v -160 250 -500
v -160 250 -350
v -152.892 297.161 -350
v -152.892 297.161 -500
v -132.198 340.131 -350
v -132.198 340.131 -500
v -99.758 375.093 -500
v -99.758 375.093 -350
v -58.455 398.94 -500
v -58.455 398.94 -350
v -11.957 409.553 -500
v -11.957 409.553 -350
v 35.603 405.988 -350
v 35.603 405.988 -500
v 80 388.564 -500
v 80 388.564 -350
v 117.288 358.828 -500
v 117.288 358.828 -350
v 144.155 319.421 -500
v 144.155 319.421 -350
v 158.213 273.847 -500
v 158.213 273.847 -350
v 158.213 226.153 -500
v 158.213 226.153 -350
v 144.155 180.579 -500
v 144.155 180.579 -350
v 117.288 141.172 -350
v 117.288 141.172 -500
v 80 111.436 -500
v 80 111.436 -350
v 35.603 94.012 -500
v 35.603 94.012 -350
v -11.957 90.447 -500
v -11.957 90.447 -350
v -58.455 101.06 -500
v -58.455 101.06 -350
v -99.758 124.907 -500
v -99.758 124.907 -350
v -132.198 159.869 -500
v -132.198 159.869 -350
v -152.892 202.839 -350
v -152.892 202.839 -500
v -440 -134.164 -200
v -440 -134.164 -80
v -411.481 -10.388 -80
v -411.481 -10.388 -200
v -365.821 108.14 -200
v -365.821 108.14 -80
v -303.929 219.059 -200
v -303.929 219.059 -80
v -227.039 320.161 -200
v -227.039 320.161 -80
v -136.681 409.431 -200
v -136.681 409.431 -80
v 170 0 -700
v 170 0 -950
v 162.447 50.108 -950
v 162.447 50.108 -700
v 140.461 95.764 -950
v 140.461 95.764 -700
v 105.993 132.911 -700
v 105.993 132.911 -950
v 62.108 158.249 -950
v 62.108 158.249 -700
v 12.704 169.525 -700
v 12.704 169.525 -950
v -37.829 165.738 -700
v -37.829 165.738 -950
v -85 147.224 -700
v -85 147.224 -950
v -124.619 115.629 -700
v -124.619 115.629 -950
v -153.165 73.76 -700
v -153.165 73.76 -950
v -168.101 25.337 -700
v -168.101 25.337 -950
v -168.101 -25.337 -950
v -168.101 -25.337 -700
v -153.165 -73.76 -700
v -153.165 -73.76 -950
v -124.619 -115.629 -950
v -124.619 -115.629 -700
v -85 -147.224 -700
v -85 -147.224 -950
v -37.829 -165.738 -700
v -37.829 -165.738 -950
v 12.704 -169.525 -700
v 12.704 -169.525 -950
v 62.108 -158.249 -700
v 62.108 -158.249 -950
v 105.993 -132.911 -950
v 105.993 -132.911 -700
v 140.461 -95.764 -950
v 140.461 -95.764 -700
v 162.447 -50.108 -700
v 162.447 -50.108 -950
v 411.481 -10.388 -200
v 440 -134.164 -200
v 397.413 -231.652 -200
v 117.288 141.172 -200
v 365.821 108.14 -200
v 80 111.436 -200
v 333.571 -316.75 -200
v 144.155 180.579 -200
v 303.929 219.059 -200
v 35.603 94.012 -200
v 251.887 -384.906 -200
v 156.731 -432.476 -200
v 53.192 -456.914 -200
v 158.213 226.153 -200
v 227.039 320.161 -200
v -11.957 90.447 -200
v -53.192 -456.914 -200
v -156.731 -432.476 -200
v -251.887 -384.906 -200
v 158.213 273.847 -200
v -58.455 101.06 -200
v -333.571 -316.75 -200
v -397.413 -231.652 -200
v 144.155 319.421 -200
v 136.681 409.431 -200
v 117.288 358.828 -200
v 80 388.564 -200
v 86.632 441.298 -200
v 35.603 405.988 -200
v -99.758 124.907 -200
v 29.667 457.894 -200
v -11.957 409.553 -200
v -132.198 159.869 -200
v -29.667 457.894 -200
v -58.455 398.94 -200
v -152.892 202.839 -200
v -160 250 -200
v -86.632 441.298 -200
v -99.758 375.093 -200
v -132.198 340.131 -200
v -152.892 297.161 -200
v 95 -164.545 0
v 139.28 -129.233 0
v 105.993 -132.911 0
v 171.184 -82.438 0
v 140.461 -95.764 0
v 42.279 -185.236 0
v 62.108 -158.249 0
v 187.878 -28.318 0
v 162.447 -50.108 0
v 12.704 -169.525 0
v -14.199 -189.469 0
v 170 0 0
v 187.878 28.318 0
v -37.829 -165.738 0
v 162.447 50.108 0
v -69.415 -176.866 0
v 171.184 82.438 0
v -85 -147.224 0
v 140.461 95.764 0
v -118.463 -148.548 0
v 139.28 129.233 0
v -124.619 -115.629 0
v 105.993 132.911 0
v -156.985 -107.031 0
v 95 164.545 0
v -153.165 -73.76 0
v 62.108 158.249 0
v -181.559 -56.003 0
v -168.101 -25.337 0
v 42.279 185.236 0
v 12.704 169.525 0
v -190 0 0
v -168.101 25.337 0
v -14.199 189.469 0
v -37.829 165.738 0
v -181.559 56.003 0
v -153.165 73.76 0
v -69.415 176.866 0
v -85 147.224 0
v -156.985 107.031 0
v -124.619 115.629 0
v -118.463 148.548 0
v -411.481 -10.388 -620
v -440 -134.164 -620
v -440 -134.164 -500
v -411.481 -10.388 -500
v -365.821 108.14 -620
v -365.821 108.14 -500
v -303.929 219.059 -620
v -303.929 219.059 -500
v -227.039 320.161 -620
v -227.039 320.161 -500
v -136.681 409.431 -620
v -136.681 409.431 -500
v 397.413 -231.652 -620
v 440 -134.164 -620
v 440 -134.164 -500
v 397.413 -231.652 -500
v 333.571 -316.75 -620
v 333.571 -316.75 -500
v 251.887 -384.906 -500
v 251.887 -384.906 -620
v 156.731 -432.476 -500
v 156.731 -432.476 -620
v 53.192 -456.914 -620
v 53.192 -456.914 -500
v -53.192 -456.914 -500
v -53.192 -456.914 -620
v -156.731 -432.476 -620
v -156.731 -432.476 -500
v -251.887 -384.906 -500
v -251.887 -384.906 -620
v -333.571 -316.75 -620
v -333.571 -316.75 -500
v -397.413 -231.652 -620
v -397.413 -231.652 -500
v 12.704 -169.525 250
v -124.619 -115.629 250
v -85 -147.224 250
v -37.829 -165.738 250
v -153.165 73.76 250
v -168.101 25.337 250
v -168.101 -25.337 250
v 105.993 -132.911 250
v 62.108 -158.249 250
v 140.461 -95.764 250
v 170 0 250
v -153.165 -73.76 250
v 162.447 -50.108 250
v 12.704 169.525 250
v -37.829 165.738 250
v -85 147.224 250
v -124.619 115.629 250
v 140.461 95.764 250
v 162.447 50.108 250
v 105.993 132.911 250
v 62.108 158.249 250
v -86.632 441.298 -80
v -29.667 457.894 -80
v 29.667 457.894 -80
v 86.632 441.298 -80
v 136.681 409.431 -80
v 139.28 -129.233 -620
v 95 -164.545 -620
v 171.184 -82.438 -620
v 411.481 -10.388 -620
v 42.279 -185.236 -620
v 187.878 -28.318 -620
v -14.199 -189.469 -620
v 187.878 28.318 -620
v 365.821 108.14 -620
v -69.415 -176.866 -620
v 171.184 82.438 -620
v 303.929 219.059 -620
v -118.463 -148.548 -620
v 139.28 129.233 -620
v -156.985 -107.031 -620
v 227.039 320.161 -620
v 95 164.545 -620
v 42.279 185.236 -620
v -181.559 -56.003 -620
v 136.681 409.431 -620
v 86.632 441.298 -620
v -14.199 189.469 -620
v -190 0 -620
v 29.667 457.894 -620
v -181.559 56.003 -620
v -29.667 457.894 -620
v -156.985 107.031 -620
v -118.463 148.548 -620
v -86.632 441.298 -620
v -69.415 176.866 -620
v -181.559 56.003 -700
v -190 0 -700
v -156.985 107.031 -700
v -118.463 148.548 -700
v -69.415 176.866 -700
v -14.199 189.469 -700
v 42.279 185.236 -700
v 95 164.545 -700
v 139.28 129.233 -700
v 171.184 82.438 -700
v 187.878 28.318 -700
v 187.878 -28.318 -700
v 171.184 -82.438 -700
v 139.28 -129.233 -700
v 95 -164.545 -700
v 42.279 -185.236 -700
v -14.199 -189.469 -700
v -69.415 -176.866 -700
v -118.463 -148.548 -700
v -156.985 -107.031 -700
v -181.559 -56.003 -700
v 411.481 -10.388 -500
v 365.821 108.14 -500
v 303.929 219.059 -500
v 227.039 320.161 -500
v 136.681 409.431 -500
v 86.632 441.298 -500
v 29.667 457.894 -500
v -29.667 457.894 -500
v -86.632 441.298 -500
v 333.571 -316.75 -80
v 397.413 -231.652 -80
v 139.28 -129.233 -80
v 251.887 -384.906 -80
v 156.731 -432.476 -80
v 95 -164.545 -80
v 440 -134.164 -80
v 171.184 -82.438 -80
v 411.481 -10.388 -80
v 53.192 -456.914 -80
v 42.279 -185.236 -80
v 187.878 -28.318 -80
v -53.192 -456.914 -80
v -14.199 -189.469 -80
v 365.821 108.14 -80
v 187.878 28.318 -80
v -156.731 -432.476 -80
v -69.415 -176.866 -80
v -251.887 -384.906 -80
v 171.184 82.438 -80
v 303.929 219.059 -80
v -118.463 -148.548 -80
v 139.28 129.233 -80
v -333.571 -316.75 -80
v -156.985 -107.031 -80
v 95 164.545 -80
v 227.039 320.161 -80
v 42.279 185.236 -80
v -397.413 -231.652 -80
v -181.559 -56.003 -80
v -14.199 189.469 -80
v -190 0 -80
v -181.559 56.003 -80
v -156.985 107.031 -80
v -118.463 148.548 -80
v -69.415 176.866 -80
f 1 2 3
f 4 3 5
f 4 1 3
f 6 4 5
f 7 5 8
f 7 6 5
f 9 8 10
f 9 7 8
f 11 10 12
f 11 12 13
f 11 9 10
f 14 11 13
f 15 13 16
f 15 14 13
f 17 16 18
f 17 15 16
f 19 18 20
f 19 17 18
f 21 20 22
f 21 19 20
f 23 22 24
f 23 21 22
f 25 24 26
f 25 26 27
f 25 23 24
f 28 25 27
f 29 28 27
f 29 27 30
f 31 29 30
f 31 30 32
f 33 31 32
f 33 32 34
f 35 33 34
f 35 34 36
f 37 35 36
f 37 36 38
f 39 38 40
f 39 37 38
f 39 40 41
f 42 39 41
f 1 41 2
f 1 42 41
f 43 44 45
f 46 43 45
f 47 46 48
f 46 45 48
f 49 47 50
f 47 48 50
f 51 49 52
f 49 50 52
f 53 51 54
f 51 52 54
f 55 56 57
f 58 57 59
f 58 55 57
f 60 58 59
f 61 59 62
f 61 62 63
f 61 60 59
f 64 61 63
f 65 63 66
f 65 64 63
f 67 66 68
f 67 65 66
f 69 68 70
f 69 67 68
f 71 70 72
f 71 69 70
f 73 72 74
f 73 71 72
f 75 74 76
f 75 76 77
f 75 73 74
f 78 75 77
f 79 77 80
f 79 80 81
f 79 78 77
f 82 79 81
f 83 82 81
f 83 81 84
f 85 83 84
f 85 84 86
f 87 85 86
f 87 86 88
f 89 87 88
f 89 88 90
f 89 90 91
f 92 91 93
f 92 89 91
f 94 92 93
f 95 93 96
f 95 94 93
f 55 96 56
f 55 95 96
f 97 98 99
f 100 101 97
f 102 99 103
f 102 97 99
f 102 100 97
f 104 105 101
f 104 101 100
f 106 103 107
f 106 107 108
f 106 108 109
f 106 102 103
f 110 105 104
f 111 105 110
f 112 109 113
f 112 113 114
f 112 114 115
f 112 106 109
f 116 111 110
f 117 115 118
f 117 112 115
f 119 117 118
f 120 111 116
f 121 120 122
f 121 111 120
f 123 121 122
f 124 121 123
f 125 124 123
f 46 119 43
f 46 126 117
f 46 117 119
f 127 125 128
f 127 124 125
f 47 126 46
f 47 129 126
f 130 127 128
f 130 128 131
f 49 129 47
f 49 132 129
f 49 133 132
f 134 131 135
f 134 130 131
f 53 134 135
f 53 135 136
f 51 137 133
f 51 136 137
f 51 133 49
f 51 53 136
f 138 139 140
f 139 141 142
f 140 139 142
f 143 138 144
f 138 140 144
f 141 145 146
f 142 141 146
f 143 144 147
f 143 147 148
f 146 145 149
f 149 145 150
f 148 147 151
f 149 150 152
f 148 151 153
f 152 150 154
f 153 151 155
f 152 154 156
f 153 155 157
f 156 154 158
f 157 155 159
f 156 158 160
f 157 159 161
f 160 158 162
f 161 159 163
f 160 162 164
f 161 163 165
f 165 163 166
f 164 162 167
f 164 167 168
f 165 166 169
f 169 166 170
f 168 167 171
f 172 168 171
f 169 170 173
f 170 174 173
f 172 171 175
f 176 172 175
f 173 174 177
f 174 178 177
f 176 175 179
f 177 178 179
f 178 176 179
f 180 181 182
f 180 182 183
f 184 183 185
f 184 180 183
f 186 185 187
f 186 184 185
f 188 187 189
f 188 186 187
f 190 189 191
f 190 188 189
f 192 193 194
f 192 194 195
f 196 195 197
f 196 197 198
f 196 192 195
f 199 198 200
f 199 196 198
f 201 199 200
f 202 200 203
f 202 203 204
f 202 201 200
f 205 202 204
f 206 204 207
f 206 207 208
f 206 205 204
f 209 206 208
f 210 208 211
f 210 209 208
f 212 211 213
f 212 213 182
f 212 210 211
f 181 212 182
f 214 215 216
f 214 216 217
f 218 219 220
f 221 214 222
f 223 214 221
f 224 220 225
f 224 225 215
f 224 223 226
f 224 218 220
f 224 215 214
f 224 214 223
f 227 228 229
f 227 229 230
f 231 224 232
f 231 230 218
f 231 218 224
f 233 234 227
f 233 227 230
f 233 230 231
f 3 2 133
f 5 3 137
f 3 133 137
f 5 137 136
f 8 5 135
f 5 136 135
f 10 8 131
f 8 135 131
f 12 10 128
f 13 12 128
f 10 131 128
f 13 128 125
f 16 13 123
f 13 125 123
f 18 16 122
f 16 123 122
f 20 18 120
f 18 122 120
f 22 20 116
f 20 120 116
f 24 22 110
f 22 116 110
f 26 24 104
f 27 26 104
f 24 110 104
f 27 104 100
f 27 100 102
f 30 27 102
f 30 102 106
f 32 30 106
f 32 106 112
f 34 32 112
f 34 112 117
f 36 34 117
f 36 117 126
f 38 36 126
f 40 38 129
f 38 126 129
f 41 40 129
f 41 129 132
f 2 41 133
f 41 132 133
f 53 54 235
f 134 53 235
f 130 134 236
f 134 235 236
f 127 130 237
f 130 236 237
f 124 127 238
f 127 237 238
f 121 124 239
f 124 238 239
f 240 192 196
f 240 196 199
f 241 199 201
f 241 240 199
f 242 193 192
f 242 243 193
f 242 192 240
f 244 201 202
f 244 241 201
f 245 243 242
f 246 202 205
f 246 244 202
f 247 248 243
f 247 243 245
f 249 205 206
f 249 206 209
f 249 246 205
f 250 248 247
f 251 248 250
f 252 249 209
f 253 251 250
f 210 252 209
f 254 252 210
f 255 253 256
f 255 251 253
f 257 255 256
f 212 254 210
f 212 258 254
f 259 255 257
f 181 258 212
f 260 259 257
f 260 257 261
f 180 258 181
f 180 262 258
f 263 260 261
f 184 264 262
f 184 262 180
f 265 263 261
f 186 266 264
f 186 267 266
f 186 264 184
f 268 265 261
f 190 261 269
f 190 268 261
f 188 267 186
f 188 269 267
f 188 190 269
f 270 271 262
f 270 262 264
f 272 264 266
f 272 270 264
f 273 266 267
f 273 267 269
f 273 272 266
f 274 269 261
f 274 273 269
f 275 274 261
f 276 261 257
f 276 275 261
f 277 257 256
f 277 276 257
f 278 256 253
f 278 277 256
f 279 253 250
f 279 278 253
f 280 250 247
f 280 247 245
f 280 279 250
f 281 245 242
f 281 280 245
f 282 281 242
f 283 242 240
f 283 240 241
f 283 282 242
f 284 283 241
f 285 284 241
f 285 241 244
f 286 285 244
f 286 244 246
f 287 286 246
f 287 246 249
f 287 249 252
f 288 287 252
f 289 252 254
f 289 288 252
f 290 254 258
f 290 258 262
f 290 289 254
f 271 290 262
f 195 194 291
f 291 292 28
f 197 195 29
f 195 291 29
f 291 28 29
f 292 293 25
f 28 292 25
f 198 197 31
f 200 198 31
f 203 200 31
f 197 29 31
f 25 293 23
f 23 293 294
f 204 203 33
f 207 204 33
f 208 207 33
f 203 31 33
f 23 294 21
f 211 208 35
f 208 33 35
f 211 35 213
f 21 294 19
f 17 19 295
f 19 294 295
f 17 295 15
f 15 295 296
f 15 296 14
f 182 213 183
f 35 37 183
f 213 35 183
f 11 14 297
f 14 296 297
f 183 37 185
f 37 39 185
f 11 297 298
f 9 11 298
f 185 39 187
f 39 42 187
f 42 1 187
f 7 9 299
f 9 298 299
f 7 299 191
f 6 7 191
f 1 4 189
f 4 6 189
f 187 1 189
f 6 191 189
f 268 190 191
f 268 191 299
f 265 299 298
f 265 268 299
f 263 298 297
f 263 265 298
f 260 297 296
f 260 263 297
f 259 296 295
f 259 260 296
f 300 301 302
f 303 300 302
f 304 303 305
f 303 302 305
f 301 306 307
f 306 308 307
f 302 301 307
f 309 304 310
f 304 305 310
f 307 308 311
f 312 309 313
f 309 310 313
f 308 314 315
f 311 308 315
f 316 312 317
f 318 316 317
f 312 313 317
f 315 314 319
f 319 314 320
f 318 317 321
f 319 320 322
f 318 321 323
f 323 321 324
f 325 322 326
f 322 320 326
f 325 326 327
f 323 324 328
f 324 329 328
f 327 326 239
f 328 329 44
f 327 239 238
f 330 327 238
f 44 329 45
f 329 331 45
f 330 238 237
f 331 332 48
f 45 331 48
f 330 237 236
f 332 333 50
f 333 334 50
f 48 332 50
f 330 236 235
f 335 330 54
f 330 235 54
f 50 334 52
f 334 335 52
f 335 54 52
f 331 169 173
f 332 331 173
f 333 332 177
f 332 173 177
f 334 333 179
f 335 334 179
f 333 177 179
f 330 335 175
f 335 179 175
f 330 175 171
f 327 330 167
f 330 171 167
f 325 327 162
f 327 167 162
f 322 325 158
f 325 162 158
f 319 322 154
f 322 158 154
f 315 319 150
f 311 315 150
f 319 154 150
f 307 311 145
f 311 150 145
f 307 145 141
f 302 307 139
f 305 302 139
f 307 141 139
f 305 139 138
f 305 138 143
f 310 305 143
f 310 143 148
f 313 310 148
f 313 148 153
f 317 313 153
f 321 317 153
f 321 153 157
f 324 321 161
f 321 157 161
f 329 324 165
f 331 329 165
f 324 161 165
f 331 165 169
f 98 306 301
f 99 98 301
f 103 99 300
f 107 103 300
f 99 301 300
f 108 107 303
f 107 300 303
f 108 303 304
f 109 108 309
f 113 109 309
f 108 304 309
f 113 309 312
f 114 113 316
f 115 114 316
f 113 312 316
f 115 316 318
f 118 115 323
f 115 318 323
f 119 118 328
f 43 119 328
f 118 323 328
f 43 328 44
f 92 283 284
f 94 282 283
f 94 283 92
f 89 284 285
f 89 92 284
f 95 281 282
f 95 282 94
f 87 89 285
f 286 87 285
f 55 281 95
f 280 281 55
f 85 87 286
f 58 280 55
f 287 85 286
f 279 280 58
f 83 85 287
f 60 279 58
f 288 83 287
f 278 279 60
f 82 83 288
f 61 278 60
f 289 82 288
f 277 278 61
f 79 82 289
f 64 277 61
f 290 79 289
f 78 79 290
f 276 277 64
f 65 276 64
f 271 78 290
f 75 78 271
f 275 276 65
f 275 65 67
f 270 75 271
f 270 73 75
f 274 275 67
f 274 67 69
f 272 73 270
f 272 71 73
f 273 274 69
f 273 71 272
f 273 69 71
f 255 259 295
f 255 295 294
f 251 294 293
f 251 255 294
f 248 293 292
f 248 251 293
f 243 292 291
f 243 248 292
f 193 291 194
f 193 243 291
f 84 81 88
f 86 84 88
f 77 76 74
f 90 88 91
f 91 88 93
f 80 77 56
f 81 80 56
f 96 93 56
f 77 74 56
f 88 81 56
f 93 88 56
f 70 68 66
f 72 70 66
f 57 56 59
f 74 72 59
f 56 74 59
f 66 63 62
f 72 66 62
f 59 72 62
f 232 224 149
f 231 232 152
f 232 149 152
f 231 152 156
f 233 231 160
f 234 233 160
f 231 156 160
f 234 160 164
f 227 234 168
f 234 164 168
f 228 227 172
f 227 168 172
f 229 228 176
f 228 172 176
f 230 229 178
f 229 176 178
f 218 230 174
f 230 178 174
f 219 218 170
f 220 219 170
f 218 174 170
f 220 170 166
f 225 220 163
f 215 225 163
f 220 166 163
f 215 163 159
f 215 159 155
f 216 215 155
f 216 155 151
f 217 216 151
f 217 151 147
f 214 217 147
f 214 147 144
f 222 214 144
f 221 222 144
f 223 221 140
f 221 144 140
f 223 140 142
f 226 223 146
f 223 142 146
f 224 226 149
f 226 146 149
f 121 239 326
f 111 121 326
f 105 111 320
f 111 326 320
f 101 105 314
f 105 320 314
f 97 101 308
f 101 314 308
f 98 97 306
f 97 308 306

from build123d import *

# Parameters (mm, degrees)
SKETCH1_R           = 170
BOSS_EXTRUDE1_DEPTH = 250
SKETCH2_R           = 190
BOSS_EXTRUDE2_DEPTH = 80
BOSS_EXTRUDE3_DEPTH = 120
SKETCH4_R           = 160
BOSS_EXTRUDE4_DEPTH = 150


with BuildPart() as part:
    # Sketch1 → Boss-Extrude1 (new body)
    with BuildSketch(Plane.XY):
        Circle(SKETCH1_R)
    extrude(amount=BOSS_EXTRUDE1_DEPTH)

    # Sketch2 → Boss-Extrude2 (add)
    with BuildSketch(Plane(origin=(0, 0, 0), x_dir=(-1, 0, 0), z_dir=(0, 0, -1))):
        Circle(SKETCH2_R)
    extrude(amount=BOSS_EXTRUDE2_DEPTH)

    # Sketch3 → Boss-Extrude3 (add)
    with BuildSketch(Plane(origin=(0, 0, -80), x_dir=(-1, 0, 0), z_dir=(0, 0, -1))):
        with BuildLine():
            ThreePointArc((-440, -134.16407865), (0, -460), (440, -134.16407865))
            ThreePointArc((440, -134.16407865), (336.834442487, 164.692576238), (136.680947576, 409.431234611))
            ThreePointArc((136.680947576, 409.431234611), (0, 460), (-136.680947576, 409.431234611))
            ThreePointArc((-136.680947576, 409.431234611), (-336.834442487, 164.692576238), (-440, -134.16407865))
        make_face()
    extrude(amount=BOSS_EXTRUDE3_DEPTH)

    # Sketch4 → Boss-Extrude4 (add)
    with BuildSketch(Plane(origin=(0, 0, -200), x_dir=(-1, 0, 0), z_dir=(0, 0, -1))):
        with Locations((0, 250)):
            Circle(SKETCH4_R)
    extrude(amount=BOSS_EXTRUDE4_DEPTH)

    # Mirror1: part across plane


with BuildPart() as part_1:
    add(part.part)
    add(part.part.mirror(Plane(origin=(0, 250, -350), x_dir=(1, 0, 0), z_dir=(0, 0, -1))))


solid = part_1.part
